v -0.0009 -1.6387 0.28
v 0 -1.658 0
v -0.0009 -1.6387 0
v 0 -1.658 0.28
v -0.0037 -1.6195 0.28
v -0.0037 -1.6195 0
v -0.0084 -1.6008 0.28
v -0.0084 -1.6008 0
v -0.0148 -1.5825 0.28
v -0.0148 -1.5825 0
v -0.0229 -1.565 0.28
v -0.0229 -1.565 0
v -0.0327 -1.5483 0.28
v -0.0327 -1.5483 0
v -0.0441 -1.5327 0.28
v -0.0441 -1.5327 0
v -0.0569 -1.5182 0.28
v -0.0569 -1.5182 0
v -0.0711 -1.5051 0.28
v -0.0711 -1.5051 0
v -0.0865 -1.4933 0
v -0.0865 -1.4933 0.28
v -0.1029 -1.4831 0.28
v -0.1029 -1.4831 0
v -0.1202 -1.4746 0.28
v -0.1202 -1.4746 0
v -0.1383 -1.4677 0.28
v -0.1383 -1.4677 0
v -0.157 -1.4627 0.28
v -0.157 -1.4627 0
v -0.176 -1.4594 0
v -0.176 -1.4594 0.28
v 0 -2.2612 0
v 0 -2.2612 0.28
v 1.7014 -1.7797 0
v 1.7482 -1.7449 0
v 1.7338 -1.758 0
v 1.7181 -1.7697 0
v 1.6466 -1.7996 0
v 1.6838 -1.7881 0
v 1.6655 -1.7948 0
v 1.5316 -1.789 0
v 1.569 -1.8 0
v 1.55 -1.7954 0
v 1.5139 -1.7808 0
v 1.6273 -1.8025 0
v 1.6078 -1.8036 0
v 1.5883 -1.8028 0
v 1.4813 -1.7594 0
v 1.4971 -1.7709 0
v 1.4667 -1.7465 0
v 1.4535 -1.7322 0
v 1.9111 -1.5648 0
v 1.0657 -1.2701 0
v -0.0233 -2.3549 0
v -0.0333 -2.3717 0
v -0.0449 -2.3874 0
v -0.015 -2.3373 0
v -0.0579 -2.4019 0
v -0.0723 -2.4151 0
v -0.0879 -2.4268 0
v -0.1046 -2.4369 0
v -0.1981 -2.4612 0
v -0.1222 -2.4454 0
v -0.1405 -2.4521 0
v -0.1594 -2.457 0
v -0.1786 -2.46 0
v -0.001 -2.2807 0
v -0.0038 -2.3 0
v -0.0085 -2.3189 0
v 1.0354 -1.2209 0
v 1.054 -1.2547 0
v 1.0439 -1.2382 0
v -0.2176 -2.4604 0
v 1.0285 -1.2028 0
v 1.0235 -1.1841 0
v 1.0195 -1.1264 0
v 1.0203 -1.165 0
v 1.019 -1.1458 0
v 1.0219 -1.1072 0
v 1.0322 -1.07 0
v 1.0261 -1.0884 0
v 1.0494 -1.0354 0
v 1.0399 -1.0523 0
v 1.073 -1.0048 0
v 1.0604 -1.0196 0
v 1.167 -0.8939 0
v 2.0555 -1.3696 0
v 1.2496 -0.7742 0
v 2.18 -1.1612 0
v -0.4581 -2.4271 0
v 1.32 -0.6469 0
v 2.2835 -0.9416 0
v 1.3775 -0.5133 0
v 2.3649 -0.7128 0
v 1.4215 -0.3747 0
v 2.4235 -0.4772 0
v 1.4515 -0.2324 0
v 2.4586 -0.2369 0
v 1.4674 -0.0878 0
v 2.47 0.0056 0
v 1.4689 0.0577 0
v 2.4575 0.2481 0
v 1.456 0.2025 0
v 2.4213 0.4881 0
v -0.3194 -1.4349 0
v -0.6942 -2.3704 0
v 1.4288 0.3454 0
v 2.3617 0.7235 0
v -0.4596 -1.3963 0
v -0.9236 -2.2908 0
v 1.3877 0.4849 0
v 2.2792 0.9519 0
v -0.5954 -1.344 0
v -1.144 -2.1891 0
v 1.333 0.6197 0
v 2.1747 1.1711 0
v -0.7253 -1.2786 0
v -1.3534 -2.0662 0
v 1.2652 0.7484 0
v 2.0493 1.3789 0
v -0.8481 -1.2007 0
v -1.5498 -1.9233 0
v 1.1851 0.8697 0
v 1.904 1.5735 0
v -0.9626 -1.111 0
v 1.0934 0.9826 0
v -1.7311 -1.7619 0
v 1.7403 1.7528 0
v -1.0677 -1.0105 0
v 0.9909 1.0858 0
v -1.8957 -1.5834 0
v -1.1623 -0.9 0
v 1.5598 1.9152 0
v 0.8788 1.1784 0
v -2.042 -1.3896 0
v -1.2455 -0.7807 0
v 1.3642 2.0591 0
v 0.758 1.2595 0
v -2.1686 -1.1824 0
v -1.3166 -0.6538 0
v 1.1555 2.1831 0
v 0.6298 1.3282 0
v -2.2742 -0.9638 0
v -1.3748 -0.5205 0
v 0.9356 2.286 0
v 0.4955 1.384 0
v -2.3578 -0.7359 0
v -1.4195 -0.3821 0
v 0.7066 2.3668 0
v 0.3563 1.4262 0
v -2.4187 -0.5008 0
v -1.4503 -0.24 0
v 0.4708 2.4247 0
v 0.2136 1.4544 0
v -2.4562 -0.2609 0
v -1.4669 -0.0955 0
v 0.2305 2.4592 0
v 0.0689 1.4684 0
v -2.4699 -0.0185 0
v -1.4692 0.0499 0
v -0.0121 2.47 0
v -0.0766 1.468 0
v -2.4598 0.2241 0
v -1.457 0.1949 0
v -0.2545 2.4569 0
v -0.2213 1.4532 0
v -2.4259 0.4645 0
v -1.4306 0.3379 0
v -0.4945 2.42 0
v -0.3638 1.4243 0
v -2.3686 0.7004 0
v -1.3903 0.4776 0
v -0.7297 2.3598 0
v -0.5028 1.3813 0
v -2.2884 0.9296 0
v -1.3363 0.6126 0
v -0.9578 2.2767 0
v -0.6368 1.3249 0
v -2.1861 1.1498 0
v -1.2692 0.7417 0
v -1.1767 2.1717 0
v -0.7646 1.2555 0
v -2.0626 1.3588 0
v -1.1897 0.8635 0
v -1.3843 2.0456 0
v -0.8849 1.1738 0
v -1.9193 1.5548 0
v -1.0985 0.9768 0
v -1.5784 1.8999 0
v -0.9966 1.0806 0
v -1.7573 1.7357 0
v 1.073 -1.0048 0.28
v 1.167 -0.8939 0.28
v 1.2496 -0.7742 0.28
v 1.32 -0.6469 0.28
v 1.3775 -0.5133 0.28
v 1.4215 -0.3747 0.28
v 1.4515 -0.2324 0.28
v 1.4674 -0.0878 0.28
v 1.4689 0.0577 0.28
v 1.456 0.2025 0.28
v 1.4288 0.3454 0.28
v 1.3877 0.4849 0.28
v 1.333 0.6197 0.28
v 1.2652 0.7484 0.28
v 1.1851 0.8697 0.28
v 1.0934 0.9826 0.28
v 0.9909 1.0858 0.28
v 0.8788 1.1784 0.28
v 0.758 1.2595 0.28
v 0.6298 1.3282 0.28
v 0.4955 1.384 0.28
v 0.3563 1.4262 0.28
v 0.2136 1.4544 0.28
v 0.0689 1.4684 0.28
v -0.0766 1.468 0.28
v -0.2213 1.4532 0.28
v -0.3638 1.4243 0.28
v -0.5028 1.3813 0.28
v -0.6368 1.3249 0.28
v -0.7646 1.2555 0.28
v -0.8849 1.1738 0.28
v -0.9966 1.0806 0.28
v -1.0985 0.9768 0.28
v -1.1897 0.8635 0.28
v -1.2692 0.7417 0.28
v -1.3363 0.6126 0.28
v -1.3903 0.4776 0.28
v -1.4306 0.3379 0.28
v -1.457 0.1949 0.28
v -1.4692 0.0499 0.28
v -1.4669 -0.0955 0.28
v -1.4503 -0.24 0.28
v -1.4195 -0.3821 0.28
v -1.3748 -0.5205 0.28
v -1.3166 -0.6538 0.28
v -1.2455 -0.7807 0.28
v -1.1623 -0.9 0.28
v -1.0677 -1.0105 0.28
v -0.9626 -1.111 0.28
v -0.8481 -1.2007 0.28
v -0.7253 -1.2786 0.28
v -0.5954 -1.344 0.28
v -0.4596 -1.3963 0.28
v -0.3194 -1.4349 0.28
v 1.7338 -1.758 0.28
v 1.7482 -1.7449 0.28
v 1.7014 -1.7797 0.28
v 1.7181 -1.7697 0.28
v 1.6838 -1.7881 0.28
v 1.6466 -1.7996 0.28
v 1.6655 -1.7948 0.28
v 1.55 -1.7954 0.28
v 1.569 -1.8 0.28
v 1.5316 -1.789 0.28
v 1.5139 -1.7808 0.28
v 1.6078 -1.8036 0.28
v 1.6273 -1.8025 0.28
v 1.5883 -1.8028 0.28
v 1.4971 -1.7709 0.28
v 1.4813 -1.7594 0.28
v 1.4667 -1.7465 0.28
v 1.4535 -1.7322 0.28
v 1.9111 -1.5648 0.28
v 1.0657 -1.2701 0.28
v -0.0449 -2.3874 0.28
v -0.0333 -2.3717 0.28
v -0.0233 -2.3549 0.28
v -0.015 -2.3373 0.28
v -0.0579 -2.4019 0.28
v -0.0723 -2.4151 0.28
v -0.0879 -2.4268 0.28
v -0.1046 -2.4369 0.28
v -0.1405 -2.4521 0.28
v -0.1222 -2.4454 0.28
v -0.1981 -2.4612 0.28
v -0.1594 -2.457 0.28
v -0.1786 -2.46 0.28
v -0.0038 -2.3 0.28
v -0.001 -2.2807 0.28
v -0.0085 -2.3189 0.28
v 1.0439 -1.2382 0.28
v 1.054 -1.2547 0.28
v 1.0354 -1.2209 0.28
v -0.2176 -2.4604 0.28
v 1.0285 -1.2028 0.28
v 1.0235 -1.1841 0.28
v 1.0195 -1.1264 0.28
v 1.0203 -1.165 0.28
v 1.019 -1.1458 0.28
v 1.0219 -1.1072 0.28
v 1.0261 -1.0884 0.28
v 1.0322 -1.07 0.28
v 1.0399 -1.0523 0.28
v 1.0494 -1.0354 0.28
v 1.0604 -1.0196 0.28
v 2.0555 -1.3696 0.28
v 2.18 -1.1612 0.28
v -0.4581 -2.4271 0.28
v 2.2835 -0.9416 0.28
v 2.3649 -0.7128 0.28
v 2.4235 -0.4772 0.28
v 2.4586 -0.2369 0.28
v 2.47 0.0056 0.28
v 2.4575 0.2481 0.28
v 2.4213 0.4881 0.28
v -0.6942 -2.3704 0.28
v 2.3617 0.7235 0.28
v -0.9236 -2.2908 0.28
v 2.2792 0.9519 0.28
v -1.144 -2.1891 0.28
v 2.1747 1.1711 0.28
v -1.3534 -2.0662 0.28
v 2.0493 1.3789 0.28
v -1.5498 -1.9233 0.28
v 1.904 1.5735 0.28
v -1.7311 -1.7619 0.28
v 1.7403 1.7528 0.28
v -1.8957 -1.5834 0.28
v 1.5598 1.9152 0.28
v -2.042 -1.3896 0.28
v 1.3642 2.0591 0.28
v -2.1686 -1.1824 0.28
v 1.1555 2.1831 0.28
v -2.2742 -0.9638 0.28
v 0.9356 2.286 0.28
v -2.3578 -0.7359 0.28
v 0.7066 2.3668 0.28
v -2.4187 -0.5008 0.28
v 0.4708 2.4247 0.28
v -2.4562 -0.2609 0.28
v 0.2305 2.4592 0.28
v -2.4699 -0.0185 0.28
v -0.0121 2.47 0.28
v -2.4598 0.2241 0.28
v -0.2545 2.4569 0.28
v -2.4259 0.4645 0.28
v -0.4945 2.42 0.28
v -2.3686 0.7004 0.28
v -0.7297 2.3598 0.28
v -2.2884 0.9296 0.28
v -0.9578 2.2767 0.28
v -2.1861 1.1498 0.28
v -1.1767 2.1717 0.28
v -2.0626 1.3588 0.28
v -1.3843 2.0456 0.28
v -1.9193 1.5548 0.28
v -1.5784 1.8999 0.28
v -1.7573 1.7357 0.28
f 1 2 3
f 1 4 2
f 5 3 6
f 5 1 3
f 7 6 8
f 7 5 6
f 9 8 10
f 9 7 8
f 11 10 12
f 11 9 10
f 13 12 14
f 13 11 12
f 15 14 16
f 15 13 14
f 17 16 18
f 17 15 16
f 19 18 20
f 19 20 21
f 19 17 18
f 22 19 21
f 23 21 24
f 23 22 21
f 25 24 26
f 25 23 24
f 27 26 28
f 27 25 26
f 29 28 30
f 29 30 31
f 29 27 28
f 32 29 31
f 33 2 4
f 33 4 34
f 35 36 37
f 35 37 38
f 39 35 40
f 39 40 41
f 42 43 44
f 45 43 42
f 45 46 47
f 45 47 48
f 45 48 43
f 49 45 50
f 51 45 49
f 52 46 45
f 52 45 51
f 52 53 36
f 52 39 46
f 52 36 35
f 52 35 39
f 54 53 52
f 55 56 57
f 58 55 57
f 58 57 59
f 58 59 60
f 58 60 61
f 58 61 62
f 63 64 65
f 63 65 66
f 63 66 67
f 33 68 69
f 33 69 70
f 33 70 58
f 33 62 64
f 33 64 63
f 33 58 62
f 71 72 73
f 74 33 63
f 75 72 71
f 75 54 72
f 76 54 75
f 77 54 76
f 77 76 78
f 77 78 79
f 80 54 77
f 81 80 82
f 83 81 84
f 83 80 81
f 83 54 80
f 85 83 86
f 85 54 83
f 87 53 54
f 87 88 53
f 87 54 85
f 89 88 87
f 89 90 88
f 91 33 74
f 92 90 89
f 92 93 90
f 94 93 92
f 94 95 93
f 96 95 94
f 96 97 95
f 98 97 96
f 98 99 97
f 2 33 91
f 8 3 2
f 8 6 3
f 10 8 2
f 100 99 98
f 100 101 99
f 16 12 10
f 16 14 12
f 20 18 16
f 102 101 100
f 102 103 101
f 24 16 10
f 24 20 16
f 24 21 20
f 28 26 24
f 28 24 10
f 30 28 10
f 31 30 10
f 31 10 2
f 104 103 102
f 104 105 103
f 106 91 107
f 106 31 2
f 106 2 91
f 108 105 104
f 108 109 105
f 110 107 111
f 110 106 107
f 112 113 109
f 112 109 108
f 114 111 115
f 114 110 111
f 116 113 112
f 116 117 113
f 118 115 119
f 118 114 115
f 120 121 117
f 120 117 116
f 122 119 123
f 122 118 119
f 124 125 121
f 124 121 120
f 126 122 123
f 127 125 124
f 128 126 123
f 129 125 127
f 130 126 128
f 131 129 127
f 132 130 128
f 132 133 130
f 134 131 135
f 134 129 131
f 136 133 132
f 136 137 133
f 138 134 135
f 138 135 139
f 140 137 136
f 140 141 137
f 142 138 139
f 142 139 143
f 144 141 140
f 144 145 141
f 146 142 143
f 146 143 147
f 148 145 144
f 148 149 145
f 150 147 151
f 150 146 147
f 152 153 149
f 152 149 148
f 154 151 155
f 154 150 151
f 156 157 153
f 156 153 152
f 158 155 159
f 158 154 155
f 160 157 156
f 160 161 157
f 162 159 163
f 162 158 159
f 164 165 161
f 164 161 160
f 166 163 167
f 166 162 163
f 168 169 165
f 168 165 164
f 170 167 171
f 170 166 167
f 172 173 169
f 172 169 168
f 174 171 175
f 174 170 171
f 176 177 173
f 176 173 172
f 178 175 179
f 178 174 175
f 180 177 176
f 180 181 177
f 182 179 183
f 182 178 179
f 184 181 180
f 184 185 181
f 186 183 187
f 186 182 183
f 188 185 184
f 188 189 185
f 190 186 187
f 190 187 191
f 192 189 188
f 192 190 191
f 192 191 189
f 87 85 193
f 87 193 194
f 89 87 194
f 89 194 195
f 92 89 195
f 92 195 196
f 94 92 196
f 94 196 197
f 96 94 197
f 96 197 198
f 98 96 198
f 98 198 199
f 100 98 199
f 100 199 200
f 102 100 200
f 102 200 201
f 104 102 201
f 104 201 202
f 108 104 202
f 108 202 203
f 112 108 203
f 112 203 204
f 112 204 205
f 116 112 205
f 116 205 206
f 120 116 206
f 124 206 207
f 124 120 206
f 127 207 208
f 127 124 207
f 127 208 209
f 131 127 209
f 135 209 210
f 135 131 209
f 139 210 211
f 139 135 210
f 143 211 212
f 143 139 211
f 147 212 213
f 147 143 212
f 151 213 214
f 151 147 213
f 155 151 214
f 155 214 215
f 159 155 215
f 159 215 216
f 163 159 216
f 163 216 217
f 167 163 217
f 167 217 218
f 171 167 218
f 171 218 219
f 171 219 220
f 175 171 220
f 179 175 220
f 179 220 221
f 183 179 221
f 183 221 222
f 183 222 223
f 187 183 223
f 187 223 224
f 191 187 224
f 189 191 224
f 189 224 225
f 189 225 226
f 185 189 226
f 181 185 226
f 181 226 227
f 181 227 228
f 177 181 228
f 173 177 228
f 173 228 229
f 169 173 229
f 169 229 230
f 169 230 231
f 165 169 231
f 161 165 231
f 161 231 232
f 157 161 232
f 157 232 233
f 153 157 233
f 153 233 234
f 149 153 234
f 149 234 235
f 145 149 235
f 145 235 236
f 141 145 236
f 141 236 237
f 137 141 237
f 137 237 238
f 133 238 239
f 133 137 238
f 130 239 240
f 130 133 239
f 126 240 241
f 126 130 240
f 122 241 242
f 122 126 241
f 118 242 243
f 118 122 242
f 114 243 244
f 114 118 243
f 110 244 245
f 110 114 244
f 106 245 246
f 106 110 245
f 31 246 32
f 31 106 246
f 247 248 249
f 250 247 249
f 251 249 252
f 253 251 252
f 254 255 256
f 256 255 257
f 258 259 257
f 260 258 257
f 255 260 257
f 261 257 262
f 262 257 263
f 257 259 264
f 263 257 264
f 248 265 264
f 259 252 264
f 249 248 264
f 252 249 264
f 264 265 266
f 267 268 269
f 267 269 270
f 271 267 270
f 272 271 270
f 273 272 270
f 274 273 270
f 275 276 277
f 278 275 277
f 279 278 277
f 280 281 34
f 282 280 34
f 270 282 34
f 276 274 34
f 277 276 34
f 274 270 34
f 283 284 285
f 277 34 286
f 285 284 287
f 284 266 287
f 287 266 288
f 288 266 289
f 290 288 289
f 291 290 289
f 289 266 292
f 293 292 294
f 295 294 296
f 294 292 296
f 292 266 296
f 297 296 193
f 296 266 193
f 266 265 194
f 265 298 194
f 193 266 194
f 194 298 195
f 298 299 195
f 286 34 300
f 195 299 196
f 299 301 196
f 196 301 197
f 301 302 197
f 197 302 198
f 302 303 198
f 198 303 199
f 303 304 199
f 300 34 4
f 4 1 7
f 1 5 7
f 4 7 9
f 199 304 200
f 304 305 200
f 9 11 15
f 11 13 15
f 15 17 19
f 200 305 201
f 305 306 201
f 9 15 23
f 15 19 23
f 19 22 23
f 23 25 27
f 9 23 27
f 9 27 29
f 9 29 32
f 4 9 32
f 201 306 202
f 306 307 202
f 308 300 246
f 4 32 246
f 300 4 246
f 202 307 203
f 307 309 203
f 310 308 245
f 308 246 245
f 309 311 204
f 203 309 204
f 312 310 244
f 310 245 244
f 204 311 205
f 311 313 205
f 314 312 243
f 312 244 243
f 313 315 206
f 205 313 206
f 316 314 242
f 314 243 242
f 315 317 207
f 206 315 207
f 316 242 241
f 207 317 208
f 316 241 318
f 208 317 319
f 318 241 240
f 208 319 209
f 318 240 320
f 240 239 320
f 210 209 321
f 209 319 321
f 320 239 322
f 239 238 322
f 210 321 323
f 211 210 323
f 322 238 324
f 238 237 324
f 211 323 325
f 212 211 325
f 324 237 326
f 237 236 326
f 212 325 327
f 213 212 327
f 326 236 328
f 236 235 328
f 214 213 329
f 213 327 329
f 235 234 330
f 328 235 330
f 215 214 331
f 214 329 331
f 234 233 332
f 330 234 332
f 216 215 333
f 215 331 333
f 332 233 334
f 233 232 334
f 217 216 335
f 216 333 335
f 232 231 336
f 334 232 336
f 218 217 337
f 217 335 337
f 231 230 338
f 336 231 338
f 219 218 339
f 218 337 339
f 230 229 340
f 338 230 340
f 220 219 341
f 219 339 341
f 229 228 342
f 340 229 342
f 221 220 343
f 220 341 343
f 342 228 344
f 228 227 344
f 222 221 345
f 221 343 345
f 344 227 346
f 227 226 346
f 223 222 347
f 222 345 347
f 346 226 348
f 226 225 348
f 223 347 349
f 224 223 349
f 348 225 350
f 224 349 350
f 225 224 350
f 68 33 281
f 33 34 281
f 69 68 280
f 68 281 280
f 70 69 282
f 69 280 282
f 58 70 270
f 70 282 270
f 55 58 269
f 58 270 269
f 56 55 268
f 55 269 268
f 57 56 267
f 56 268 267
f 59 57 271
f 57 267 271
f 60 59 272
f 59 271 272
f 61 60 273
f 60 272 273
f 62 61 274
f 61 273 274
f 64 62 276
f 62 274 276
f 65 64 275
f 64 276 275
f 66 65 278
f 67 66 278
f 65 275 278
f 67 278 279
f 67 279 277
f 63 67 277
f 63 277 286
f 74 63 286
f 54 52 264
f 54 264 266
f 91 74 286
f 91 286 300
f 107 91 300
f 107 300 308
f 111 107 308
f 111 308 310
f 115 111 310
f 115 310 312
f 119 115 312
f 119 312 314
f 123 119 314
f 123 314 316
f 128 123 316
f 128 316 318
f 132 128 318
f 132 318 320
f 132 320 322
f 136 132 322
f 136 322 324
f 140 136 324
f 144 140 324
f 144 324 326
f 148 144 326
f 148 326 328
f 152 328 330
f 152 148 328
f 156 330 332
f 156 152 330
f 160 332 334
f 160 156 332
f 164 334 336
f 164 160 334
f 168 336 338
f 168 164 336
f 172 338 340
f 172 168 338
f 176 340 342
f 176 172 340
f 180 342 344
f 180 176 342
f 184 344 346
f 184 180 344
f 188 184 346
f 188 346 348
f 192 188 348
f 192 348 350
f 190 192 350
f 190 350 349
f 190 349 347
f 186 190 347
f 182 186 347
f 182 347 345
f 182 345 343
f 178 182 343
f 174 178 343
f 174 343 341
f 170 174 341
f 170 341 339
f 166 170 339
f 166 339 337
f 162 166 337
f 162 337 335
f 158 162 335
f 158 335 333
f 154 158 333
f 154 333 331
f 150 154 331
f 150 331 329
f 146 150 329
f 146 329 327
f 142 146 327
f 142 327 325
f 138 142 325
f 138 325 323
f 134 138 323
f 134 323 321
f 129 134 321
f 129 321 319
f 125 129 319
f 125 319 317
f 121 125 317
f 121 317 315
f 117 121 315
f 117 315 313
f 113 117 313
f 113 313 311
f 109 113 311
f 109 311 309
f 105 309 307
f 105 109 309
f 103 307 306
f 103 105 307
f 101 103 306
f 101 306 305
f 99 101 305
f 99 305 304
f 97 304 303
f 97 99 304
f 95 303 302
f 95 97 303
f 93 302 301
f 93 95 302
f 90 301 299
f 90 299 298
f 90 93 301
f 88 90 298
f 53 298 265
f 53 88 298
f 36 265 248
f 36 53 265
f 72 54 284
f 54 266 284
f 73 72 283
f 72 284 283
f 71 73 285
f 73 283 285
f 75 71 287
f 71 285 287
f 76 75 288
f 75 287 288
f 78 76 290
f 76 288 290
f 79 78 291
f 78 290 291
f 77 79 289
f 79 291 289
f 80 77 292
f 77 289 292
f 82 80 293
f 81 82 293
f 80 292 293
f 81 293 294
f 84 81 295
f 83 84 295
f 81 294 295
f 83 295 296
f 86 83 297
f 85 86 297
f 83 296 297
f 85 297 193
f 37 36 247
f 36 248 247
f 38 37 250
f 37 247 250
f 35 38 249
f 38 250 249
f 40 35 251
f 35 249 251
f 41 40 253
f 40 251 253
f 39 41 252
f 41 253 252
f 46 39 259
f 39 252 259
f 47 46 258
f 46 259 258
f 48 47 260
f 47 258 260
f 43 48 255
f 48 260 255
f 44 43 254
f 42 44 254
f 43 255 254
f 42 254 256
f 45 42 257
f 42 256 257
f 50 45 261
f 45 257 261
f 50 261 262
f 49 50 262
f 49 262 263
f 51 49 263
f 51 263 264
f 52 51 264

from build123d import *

# Parameters (mm, degrees)
BOSS_EXTRU_1_DEPTH = 0.28
CONG_1_R           = 0.2


with BuildPart() as part:
    # Esquisse1 → Boss.-Extru.1 (new body)
    with BuildSketch(Plane.XY):
        with BuildLine():
            Line((0, -1.47), (0, -2.47))
            ThreePointArc((0, -2.47), (-0.844789754, 2.321040773), (1.587685396, -1.892129775))
            Line((1.587685396, -1.892129775), (0.944897786, -1.126085331))
            ThreePointArc((0.944897786, -1.126085331), (-0.502769611, 1.381348153), (0, -1.47))
        make_face()
    extrude(amount=BOSS_EXTRU_1_DEPTH)

    # Congé1
    cong_1_edges = [part.edges().sort_by_distance(p)[0] for p in [
        (0, -1.47, 0.14),
        (0, -2.47, 0.14),
        (1.587685396, -1.892129775, 0.14),
        (0.944897786, -1.126085331, 0.14),
    ]]
    fillet(cong_1_edges, radius=CONG_1_R)


solid = part.part
